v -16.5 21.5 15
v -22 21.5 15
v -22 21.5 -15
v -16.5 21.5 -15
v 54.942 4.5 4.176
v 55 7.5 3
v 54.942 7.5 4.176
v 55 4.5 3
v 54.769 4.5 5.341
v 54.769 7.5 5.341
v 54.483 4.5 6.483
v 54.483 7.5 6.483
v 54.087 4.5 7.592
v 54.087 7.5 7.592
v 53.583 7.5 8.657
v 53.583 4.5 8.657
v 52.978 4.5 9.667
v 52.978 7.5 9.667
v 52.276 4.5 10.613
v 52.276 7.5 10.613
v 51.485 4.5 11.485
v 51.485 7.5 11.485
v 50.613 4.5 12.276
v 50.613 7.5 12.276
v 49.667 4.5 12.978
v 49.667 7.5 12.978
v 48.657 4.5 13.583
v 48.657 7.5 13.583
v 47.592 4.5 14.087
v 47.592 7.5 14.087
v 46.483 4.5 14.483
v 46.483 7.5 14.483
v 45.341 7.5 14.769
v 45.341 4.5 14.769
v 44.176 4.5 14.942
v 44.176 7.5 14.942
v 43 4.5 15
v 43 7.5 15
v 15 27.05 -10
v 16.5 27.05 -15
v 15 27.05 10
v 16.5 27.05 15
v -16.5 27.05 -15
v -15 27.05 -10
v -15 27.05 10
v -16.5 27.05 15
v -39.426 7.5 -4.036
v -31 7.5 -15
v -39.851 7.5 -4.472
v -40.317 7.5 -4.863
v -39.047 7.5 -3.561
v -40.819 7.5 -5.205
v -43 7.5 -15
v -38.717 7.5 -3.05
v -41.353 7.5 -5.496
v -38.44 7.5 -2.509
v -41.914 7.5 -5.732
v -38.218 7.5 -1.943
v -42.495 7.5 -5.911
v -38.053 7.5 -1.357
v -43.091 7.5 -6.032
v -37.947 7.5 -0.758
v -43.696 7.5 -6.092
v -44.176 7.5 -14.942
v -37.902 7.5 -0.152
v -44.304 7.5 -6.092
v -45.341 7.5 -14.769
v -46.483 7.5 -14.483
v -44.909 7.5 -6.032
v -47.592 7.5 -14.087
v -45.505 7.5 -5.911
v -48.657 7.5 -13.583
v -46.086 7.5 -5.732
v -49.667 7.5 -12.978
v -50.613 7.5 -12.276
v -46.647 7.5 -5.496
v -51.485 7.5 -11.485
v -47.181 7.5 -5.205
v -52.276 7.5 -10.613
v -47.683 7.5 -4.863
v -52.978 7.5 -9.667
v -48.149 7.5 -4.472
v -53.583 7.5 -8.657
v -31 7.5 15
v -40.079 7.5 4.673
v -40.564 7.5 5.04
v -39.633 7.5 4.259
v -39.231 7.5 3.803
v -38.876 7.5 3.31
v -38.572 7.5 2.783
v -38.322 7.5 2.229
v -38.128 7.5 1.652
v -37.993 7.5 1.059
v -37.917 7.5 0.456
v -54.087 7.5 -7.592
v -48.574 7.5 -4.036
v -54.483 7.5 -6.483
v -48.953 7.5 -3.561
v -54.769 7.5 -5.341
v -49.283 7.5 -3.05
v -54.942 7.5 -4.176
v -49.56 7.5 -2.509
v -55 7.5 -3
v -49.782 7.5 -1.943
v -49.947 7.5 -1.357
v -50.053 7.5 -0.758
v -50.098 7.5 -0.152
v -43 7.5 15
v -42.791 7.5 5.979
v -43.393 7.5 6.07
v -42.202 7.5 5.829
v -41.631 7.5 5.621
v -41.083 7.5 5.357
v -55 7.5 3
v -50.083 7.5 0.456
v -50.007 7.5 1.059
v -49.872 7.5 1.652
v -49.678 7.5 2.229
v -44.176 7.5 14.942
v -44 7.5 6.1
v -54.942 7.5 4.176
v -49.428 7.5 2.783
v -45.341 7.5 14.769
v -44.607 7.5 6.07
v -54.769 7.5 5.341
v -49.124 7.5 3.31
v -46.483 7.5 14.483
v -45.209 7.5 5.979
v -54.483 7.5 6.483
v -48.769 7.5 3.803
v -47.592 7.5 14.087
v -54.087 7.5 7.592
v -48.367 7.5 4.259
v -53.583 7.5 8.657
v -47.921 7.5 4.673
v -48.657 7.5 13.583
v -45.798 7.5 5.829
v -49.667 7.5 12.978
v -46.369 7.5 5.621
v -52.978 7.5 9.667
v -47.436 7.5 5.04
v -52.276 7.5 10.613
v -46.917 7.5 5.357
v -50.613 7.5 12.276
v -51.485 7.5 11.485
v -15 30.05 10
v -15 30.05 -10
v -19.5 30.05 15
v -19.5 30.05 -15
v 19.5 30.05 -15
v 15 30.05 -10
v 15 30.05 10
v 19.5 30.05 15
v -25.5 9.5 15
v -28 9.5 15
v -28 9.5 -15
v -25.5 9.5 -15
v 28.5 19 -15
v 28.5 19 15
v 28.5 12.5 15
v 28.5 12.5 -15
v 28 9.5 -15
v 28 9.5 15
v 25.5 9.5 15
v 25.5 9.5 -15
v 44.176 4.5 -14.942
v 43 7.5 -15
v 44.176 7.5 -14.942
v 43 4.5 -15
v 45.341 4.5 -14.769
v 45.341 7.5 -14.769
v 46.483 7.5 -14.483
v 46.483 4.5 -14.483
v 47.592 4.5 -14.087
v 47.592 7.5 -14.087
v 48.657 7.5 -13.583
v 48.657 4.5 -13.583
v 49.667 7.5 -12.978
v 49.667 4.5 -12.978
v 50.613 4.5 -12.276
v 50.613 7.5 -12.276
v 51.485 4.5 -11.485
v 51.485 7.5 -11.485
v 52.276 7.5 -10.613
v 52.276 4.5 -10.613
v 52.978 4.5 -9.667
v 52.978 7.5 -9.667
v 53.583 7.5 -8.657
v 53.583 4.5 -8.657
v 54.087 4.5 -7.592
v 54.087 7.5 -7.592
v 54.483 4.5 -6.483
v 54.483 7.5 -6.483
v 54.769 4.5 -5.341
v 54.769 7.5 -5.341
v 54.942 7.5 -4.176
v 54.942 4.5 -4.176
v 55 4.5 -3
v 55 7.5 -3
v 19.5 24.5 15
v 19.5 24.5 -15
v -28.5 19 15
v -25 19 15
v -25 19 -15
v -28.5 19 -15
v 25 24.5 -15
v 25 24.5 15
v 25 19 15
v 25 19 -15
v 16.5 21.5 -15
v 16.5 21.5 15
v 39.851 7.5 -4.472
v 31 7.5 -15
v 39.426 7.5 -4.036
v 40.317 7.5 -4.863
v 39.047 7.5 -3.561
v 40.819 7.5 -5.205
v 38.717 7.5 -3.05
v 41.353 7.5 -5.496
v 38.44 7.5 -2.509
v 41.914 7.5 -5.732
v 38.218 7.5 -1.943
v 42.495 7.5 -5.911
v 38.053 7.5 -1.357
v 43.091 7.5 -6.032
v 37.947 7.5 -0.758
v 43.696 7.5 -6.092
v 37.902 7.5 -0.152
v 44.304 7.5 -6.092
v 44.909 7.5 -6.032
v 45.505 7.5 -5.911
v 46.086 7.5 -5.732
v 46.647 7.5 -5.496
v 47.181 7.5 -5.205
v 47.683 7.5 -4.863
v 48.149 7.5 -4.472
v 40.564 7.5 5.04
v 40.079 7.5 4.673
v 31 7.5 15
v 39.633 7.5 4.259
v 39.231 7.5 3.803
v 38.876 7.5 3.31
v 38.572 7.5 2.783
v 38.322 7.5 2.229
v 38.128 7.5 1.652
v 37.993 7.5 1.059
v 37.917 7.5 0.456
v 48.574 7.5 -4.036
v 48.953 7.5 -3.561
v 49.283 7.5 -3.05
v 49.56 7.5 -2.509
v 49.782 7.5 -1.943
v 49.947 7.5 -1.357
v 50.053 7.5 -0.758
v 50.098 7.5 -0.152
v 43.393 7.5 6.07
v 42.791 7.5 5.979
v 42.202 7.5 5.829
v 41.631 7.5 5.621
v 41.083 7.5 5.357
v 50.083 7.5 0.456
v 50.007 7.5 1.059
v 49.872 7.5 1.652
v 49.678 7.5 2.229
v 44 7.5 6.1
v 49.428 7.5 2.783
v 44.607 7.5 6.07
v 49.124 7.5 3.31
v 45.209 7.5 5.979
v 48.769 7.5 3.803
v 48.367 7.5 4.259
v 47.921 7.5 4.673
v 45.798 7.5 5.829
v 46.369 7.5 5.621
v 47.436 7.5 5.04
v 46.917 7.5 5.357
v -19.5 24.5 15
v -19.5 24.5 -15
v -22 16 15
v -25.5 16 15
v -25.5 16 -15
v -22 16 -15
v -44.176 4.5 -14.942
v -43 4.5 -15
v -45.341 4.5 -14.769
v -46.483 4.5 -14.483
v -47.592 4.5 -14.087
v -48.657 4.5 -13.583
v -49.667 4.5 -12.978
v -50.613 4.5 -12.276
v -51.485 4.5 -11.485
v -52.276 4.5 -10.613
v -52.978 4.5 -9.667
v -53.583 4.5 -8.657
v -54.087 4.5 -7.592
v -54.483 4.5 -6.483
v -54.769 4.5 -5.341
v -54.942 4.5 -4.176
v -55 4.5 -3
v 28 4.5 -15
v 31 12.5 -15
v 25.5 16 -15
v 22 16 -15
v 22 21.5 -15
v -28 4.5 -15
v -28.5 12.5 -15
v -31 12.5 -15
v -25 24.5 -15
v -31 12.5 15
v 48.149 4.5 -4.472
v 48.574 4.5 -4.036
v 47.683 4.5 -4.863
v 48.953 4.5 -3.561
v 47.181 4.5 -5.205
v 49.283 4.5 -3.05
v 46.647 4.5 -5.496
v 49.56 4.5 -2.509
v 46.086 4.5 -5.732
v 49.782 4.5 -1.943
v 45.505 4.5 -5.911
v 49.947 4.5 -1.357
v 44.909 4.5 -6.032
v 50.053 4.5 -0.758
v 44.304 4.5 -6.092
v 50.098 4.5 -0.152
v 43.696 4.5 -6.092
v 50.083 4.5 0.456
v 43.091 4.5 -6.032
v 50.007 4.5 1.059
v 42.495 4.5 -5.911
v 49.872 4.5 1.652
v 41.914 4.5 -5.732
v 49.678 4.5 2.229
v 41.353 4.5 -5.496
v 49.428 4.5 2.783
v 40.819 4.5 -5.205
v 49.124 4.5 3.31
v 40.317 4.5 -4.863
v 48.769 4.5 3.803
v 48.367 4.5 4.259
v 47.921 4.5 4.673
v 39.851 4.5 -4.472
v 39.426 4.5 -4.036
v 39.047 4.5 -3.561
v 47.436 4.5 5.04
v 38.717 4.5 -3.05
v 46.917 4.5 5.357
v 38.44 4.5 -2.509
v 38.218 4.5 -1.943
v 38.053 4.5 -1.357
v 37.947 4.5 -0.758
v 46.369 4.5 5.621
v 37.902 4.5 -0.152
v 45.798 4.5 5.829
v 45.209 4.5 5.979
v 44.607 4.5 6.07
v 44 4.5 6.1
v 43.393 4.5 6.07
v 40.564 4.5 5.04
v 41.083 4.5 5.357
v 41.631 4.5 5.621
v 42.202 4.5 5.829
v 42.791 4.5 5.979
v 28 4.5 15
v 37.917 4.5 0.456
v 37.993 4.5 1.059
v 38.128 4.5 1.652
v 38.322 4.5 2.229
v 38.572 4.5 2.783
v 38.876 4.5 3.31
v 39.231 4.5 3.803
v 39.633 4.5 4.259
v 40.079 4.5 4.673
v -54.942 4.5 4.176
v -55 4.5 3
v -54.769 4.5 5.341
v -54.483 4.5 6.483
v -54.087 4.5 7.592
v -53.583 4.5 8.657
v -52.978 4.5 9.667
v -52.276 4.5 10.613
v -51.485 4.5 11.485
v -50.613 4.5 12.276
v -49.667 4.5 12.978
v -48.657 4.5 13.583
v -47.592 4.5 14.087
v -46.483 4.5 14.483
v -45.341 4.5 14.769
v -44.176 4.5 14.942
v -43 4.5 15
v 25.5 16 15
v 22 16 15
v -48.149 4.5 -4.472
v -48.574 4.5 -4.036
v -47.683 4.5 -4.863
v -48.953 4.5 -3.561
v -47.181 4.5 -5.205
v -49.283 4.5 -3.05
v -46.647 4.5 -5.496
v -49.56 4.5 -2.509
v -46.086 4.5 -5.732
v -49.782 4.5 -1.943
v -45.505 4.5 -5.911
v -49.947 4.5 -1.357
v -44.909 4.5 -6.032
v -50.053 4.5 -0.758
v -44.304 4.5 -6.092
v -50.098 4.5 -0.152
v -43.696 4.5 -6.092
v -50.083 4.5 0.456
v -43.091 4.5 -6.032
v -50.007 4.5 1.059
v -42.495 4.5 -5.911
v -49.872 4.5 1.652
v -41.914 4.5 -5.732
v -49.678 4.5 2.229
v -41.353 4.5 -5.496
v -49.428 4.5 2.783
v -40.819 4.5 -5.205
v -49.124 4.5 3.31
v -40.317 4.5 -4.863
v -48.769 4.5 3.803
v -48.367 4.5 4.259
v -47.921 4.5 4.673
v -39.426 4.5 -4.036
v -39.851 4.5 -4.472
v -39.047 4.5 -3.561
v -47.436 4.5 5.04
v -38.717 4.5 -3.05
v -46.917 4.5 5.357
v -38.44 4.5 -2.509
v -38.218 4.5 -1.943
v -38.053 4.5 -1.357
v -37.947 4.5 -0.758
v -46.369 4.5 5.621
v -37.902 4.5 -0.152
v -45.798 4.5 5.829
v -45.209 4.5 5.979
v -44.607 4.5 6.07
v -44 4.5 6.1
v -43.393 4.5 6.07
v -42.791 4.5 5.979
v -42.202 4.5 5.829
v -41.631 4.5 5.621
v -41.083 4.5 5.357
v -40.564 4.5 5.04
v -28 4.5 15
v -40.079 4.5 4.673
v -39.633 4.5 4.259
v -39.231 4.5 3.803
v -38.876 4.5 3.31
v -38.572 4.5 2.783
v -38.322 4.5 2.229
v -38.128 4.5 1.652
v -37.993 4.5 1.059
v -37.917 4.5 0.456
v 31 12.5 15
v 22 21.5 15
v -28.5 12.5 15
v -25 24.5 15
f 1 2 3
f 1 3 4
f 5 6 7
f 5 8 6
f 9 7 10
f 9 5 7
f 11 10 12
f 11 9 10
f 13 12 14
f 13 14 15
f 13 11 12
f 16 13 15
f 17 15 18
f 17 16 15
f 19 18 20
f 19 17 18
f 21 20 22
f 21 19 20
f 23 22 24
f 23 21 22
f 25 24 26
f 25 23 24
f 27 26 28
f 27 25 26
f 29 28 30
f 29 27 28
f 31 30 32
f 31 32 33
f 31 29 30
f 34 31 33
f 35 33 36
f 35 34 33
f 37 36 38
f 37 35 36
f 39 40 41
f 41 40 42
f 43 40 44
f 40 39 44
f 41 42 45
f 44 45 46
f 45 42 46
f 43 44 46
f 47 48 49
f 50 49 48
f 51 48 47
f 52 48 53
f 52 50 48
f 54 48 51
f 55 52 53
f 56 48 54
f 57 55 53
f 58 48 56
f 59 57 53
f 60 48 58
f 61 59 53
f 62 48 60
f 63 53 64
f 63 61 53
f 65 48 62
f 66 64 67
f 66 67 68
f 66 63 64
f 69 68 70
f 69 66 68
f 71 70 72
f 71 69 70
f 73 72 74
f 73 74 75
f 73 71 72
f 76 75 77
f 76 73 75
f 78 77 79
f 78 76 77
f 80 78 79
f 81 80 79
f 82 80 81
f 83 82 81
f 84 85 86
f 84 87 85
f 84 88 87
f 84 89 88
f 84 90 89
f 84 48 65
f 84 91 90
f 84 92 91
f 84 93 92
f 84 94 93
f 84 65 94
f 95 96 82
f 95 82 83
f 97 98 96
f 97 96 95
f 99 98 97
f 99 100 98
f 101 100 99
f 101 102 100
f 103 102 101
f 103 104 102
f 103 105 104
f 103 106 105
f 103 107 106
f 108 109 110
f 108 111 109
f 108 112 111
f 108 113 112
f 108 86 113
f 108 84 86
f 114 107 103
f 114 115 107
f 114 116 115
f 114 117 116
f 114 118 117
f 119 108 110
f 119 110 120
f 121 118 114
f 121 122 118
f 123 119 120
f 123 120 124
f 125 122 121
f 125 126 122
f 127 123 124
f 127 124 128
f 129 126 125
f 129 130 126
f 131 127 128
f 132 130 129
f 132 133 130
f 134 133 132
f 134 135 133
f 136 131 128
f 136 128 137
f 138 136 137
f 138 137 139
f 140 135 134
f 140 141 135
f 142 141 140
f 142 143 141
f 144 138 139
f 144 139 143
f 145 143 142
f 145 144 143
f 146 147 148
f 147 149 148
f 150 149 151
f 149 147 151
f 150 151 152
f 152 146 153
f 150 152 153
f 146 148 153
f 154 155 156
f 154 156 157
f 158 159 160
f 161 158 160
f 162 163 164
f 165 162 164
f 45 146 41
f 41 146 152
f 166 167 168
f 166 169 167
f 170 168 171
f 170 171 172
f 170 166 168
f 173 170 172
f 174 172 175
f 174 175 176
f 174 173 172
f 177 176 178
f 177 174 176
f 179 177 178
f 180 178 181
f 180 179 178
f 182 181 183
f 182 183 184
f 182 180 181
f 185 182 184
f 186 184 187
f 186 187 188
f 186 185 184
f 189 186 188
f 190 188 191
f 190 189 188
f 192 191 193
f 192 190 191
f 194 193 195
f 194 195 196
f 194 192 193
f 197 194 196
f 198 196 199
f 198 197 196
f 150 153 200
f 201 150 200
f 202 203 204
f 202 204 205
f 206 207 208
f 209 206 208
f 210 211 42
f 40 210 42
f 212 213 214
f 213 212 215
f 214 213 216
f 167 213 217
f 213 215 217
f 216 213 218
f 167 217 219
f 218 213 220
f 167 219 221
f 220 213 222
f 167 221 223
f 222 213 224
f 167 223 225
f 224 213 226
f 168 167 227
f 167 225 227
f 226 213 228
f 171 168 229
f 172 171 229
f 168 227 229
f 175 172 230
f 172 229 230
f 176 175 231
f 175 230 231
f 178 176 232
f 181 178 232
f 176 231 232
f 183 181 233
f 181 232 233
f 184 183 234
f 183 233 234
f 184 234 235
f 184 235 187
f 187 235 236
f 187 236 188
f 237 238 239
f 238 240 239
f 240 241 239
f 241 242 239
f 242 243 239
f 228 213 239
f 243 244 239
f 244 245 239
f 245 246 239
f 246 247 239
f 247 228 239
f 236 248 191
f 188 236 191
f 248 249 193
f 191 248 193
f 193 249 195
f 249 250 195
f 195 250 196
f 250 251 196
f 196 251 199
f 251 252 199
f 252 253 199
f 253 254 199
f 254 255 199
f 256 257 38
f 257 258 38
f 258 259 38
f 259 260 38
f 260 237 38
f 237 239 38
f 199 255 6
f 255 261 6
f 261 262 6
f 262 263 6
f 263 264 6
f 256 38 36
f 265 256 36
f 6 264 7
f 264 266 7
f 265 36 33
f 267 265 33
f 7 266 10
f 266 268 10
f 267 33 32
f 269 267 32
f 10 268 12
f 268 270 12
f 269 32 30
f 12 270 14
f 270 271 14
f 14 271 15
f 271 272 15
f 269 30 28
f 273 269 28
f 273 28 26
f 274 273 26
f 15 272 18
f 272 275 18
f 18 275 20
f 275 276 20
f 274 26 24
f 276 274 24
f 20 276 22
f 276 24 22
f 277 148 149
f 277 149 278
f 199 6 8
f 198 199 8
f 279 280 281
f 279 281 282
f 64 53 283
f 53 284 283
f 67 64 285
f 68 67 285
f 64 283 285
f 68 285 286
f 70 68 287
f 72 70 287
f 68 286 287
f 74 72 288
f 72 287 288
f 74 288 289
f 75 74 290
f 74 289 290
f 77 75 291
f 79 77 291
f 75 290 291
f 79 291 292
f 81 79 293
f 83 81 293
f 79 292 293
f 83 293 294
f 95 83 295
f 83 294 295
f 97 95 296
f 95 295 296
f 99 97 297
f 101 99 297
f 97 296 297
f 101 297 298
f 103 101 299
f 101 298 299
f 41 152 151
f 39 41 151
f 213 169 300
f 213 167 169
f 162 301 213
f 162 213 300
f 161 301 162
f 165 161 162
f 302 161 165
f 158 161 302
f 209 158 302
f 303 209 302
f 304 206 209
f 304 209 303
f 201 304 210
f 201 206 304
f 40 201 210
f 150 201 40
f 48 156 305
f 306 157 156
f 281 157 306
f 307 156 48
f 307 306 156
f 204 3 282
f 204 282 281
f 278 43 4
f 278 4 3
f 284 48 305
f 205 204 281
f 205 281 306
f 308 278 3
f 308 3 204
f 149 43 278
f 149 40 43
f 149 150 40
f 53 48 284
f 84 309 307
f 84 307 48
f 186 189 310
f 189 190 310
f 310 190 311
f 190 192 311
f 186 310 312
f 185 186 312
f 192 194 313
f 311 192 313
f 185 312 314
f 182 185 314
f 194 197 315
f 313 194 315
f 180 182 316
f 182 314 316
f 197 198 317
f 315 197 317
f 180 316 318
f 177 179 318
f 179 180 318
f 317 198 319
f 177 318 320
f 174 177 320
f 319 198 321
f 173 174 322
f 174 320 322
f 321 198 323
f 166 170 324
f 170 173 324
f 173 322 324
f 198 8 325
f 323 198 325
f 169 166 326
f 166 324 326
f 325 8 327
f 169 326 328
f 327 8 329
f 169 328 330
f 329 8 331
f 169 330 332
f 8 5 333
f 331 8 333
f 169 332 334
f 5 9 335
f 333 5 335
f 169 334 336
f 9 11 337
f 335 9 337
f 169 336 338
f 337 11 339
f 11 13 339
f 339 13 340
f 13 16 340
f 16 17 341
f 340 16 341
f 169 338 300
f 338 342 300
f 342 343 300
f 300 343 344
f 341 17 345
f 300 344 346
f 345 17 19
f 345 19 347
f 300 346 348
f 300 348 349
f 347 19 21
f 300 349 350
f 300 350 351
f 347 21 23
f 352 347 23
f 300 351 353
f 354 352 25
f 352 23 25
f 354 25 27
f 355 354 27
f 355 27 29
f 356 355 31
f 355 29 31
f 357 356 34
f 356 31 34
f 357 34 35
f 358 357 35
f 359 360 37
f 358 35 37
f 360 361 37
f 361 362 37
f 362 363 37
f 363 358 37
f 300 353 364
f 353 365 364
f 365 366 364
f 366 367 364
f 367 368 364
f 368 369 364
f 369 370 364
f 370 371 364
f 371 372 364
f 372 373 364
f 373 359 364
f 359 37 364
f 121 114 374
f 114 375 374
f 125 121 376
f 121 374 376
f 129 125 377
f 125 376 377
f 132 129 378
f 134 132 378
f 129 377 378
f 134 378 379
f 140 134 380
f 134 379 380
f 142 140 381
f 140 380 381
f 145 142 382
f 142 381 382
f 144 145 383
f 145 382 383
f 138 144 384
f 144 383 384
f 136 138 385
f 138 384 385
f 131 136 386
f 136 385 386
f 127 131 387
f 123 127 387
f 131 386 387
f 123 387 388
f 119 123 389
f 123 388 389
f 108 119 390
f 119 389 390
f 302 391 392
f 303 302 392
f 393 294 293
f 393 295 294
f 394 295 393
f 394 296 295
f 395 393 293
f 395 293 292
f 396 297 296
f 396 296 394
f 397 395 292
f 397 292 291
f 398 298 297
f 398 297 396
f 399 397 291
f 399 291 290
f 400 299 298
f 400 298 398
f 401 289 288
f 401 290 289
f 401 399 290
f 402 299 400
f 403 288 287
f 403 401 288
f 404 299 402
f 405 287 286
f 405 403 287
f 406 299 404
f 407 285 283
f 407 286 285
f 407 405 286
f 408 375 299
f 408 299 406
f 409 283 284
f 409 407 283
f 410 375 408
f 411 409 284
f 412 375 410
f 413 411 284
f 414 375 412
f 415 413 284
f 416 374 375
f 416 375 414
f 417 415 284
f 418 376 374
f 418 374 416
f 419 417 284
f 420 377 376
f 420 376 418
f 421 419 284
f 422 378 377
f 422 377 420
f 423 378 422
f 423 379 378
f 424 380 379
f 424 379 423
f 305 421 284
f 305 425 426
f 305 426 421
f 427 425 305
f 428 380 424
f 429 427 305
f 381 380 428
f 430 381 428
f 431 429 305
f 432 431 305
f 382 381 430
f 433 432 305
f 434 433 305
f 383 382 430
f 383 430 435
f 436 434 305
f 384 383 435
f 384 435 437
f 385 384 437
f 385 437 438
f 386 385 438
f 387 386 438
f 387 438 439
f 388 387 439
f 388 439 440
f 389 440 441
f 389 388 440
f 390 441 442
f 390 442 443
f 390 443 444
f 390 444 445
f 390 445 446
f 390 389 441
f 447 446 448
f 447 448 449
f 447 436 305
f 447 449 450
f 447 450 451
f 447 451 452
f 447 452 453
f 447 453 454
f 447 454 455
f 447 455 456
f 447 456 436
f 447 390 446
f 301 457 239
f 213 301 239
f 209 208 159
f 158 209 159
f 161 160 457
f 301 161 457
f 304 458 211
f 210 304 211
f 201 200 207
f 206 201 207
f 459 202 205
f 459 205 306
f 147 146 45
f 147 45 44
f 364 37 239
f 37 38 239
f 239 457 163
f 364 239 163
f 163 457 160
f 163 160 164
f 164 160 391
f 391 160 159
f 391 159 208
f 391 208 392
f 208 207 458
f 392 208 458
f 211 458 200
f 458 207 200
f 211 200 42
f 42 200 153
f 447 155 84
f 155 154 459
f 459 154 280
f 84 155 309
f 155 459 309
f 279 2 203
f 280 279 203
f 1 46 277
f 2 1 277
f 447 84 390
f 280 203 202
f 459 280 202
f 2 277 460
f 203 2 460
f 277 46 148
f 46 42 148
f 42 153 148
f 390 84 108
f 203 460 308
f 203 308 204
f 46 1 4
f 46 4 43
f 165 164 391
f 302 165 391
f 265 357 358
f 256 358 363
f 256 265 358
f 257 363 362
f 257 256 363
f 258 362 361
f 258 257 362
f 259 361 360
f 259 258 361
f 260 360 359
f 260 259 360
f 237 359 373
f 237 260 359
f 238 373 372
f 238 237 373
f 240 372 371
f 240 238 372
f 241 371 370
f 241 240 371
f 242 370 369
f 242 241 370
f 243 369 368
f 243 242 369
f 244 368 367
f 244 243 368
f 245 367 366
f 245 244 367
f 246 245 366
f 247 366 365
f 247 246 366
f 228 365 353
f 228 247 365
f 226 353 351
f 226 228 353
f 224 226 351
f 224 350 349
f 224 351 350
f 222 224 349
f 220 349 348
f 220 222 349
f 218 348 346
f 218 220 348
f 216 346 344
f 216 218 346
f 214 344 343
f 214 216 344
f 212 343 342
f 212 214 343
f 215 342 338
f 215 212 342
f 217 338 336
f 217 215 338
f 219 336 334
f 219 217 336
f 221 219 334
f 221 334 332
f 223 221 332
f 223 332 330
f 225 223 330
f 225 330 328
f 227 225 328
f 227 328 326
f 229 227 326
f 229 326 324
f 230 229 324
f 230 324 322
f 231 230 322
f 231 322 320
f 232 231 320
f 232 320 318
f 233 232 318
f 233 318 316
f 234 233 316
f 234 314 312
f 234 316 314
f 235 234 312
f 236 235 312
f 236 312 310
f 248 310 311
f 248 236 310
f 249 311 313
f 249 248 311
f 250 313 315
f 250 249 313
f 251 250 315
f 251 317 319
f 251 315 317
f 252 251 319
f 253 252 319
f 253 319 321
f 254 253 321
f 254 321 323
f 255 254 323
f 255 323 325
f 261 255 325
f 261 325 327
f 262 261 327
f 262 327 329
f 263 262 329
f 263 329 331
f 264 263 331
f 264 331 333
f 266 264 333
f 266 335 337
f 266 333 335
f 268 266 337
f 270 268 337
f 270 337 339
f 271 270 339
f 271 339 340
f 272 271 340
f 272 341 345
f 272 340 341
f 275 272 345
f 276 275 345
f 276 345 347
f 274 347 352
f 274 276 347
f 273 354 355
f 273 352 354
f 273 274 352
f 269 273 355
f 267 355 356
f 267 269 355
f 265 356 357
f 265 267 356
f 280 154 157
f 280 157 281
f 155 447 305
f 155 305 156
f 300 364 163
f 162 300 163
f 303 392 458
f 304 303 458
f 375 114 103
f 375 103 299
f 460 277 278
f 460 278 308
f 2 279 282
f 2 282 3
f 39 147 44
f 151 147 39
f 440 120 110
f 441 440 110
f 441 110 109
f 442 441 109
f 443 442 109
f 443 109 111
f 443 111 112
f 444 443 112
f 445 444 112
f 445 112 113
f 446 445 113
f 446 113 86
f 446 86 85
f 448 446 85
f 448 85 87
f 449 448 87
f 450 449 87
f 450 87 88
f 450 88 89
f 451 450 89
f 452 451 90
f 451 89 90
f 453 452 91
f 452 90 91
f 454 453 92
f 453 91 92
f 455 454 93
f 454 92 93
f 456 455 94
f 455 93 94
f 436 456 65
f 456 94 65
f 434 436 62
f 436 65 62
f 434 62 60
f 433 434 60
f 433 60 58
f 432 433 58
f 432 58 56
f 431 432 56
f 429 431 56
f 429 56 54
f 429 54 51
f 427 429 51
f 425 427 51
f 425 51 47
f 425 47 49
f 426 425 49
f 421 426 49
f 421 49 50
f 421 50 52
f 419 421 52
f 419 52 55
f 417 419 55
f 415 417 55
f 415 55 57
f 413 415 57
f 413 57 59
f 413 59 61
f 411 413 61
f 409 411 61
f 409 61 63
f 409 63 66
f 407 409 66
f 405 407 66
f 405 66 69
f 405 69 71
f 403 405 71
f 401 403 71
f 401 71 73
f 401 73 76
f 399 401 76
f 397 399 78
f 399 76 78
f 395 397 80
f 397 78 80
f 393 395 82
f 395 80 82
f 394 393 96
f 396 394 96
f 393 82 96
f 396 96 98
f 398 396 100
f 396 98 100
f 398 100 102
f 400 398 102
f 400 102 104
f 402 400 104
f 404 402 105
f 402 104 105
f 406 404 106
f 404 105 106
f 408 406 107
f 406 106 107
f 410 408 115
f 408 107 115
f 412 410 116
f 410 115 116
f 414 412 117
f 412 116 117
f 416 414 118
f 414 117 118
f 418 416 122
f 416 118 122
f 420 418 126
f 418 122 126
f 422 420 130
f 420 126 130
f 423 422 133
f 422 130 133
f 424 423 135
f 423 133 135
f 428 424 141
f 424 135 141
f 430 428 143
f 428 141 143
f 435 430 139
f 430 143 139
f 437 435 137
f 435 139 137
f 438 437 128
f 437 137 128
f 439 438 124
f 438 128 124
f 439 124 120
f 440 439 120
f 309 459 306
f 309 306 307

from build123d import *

# Parameters (mm, degrees)
EXTRUDE_THIN1_DEPTH  = 15
SKETCH2_R            = 6.1
CUT_EXTRUDE1_DEPTH   = 62.306626885
FILLET1_R            = 12
FILLET1_OF_MIRROR1_R = 12
SKETCH3_W            = 30
SKETCH3_H            = 20
CUT_EXTRUDE2_DEPTH   = 63.472413912


with BuildPart() as part:
    # Sketch1 → Extrude-Thin1 (new, symmetric)
    with BuildSketch(Plane.XY):
        Polygon((-55, 4.5), (-28, 4.5), (-28, 9.5), (-25.5, 9.5), (-25.5, 16), (-22, 16), (-22, 21.5), (-16.5, 21.5), (-16.5, 27.05), (0, 27.05), (0, 30.05), (-19.5, 30.05), (-19.5, 24.5), (-25, 24.5), (-25, 19), (-28.5, 19), (-28.5, 12.5), (-31, 12.5), (-31, 7.5), (-55, 7.5), align=None)
    extrude_thin1 = extrude(amount=EXTRUDE_THIN1_DEPTH, both=True)

    # Sketch2 → Cut-Extrude1 (cut, through all)
    with BuildSketch(Plane(origin=(0, 7.5, 0), x_dir=(1, 0, 0), z_dir=(0, 1, 0))):
        with Locations(Location((-44, 0, 0), (0, 0, 270))):
            Circle(SKETCH2_R)
    cut_extrude1 = extrude(amount=-CUT_EXTRUDE1_DEPTH, mode=Mode.SUBTRACT)

    # Fillet1
    fillet1_edges = [part.edges().sort_by_distance(p)[0] for p in [
        (-55, 6, -15),
        (-55, 6, 15),
    ]]
    fillet(fillet1_edges, radius=FILLET1_R)

    # Mirror1: Extrude-Thin1, Cut-Extrude1 across plane
    add(extrude_thin1.mirror(Plane(origin=(0, 30.05, 15), x_dir=(0, 0, 1), z_dir=(1, 0, 0))))
    add(cut_extrude1.mirror(Plane(origin=(0, 30.05, 15), x_dir=(0, 0, 1), z_dir=(1, 0, 0))), mode=Mode.SUBTRACT)

    # Fillet1 of Mirror1
    fillet1_of_mirror1_edges = [part.edges().sort_by_distance(p)[0] for p in [
        (55, 6, -15),
        (55, 6, 15),
    ]]
    fillet(fillet1_of_mirror1_edges, radius=FILLET1_OF_MIRROR1_R)

    # Sketch3 → Cut-Extrude2 (cut, through all)
    with BuildSketch(Plane(origin=(0, 30.05, 0), x_dir=(1, 0, 0), z_dir=(0, 1, 0))):
        Rectangle(SKETCH3_W, SKETCH3_H)
    extrude(amount=-CUT_EXTRUDE2_DEPTH, mode=Mode.SUBTRACT)


solid = part.part
